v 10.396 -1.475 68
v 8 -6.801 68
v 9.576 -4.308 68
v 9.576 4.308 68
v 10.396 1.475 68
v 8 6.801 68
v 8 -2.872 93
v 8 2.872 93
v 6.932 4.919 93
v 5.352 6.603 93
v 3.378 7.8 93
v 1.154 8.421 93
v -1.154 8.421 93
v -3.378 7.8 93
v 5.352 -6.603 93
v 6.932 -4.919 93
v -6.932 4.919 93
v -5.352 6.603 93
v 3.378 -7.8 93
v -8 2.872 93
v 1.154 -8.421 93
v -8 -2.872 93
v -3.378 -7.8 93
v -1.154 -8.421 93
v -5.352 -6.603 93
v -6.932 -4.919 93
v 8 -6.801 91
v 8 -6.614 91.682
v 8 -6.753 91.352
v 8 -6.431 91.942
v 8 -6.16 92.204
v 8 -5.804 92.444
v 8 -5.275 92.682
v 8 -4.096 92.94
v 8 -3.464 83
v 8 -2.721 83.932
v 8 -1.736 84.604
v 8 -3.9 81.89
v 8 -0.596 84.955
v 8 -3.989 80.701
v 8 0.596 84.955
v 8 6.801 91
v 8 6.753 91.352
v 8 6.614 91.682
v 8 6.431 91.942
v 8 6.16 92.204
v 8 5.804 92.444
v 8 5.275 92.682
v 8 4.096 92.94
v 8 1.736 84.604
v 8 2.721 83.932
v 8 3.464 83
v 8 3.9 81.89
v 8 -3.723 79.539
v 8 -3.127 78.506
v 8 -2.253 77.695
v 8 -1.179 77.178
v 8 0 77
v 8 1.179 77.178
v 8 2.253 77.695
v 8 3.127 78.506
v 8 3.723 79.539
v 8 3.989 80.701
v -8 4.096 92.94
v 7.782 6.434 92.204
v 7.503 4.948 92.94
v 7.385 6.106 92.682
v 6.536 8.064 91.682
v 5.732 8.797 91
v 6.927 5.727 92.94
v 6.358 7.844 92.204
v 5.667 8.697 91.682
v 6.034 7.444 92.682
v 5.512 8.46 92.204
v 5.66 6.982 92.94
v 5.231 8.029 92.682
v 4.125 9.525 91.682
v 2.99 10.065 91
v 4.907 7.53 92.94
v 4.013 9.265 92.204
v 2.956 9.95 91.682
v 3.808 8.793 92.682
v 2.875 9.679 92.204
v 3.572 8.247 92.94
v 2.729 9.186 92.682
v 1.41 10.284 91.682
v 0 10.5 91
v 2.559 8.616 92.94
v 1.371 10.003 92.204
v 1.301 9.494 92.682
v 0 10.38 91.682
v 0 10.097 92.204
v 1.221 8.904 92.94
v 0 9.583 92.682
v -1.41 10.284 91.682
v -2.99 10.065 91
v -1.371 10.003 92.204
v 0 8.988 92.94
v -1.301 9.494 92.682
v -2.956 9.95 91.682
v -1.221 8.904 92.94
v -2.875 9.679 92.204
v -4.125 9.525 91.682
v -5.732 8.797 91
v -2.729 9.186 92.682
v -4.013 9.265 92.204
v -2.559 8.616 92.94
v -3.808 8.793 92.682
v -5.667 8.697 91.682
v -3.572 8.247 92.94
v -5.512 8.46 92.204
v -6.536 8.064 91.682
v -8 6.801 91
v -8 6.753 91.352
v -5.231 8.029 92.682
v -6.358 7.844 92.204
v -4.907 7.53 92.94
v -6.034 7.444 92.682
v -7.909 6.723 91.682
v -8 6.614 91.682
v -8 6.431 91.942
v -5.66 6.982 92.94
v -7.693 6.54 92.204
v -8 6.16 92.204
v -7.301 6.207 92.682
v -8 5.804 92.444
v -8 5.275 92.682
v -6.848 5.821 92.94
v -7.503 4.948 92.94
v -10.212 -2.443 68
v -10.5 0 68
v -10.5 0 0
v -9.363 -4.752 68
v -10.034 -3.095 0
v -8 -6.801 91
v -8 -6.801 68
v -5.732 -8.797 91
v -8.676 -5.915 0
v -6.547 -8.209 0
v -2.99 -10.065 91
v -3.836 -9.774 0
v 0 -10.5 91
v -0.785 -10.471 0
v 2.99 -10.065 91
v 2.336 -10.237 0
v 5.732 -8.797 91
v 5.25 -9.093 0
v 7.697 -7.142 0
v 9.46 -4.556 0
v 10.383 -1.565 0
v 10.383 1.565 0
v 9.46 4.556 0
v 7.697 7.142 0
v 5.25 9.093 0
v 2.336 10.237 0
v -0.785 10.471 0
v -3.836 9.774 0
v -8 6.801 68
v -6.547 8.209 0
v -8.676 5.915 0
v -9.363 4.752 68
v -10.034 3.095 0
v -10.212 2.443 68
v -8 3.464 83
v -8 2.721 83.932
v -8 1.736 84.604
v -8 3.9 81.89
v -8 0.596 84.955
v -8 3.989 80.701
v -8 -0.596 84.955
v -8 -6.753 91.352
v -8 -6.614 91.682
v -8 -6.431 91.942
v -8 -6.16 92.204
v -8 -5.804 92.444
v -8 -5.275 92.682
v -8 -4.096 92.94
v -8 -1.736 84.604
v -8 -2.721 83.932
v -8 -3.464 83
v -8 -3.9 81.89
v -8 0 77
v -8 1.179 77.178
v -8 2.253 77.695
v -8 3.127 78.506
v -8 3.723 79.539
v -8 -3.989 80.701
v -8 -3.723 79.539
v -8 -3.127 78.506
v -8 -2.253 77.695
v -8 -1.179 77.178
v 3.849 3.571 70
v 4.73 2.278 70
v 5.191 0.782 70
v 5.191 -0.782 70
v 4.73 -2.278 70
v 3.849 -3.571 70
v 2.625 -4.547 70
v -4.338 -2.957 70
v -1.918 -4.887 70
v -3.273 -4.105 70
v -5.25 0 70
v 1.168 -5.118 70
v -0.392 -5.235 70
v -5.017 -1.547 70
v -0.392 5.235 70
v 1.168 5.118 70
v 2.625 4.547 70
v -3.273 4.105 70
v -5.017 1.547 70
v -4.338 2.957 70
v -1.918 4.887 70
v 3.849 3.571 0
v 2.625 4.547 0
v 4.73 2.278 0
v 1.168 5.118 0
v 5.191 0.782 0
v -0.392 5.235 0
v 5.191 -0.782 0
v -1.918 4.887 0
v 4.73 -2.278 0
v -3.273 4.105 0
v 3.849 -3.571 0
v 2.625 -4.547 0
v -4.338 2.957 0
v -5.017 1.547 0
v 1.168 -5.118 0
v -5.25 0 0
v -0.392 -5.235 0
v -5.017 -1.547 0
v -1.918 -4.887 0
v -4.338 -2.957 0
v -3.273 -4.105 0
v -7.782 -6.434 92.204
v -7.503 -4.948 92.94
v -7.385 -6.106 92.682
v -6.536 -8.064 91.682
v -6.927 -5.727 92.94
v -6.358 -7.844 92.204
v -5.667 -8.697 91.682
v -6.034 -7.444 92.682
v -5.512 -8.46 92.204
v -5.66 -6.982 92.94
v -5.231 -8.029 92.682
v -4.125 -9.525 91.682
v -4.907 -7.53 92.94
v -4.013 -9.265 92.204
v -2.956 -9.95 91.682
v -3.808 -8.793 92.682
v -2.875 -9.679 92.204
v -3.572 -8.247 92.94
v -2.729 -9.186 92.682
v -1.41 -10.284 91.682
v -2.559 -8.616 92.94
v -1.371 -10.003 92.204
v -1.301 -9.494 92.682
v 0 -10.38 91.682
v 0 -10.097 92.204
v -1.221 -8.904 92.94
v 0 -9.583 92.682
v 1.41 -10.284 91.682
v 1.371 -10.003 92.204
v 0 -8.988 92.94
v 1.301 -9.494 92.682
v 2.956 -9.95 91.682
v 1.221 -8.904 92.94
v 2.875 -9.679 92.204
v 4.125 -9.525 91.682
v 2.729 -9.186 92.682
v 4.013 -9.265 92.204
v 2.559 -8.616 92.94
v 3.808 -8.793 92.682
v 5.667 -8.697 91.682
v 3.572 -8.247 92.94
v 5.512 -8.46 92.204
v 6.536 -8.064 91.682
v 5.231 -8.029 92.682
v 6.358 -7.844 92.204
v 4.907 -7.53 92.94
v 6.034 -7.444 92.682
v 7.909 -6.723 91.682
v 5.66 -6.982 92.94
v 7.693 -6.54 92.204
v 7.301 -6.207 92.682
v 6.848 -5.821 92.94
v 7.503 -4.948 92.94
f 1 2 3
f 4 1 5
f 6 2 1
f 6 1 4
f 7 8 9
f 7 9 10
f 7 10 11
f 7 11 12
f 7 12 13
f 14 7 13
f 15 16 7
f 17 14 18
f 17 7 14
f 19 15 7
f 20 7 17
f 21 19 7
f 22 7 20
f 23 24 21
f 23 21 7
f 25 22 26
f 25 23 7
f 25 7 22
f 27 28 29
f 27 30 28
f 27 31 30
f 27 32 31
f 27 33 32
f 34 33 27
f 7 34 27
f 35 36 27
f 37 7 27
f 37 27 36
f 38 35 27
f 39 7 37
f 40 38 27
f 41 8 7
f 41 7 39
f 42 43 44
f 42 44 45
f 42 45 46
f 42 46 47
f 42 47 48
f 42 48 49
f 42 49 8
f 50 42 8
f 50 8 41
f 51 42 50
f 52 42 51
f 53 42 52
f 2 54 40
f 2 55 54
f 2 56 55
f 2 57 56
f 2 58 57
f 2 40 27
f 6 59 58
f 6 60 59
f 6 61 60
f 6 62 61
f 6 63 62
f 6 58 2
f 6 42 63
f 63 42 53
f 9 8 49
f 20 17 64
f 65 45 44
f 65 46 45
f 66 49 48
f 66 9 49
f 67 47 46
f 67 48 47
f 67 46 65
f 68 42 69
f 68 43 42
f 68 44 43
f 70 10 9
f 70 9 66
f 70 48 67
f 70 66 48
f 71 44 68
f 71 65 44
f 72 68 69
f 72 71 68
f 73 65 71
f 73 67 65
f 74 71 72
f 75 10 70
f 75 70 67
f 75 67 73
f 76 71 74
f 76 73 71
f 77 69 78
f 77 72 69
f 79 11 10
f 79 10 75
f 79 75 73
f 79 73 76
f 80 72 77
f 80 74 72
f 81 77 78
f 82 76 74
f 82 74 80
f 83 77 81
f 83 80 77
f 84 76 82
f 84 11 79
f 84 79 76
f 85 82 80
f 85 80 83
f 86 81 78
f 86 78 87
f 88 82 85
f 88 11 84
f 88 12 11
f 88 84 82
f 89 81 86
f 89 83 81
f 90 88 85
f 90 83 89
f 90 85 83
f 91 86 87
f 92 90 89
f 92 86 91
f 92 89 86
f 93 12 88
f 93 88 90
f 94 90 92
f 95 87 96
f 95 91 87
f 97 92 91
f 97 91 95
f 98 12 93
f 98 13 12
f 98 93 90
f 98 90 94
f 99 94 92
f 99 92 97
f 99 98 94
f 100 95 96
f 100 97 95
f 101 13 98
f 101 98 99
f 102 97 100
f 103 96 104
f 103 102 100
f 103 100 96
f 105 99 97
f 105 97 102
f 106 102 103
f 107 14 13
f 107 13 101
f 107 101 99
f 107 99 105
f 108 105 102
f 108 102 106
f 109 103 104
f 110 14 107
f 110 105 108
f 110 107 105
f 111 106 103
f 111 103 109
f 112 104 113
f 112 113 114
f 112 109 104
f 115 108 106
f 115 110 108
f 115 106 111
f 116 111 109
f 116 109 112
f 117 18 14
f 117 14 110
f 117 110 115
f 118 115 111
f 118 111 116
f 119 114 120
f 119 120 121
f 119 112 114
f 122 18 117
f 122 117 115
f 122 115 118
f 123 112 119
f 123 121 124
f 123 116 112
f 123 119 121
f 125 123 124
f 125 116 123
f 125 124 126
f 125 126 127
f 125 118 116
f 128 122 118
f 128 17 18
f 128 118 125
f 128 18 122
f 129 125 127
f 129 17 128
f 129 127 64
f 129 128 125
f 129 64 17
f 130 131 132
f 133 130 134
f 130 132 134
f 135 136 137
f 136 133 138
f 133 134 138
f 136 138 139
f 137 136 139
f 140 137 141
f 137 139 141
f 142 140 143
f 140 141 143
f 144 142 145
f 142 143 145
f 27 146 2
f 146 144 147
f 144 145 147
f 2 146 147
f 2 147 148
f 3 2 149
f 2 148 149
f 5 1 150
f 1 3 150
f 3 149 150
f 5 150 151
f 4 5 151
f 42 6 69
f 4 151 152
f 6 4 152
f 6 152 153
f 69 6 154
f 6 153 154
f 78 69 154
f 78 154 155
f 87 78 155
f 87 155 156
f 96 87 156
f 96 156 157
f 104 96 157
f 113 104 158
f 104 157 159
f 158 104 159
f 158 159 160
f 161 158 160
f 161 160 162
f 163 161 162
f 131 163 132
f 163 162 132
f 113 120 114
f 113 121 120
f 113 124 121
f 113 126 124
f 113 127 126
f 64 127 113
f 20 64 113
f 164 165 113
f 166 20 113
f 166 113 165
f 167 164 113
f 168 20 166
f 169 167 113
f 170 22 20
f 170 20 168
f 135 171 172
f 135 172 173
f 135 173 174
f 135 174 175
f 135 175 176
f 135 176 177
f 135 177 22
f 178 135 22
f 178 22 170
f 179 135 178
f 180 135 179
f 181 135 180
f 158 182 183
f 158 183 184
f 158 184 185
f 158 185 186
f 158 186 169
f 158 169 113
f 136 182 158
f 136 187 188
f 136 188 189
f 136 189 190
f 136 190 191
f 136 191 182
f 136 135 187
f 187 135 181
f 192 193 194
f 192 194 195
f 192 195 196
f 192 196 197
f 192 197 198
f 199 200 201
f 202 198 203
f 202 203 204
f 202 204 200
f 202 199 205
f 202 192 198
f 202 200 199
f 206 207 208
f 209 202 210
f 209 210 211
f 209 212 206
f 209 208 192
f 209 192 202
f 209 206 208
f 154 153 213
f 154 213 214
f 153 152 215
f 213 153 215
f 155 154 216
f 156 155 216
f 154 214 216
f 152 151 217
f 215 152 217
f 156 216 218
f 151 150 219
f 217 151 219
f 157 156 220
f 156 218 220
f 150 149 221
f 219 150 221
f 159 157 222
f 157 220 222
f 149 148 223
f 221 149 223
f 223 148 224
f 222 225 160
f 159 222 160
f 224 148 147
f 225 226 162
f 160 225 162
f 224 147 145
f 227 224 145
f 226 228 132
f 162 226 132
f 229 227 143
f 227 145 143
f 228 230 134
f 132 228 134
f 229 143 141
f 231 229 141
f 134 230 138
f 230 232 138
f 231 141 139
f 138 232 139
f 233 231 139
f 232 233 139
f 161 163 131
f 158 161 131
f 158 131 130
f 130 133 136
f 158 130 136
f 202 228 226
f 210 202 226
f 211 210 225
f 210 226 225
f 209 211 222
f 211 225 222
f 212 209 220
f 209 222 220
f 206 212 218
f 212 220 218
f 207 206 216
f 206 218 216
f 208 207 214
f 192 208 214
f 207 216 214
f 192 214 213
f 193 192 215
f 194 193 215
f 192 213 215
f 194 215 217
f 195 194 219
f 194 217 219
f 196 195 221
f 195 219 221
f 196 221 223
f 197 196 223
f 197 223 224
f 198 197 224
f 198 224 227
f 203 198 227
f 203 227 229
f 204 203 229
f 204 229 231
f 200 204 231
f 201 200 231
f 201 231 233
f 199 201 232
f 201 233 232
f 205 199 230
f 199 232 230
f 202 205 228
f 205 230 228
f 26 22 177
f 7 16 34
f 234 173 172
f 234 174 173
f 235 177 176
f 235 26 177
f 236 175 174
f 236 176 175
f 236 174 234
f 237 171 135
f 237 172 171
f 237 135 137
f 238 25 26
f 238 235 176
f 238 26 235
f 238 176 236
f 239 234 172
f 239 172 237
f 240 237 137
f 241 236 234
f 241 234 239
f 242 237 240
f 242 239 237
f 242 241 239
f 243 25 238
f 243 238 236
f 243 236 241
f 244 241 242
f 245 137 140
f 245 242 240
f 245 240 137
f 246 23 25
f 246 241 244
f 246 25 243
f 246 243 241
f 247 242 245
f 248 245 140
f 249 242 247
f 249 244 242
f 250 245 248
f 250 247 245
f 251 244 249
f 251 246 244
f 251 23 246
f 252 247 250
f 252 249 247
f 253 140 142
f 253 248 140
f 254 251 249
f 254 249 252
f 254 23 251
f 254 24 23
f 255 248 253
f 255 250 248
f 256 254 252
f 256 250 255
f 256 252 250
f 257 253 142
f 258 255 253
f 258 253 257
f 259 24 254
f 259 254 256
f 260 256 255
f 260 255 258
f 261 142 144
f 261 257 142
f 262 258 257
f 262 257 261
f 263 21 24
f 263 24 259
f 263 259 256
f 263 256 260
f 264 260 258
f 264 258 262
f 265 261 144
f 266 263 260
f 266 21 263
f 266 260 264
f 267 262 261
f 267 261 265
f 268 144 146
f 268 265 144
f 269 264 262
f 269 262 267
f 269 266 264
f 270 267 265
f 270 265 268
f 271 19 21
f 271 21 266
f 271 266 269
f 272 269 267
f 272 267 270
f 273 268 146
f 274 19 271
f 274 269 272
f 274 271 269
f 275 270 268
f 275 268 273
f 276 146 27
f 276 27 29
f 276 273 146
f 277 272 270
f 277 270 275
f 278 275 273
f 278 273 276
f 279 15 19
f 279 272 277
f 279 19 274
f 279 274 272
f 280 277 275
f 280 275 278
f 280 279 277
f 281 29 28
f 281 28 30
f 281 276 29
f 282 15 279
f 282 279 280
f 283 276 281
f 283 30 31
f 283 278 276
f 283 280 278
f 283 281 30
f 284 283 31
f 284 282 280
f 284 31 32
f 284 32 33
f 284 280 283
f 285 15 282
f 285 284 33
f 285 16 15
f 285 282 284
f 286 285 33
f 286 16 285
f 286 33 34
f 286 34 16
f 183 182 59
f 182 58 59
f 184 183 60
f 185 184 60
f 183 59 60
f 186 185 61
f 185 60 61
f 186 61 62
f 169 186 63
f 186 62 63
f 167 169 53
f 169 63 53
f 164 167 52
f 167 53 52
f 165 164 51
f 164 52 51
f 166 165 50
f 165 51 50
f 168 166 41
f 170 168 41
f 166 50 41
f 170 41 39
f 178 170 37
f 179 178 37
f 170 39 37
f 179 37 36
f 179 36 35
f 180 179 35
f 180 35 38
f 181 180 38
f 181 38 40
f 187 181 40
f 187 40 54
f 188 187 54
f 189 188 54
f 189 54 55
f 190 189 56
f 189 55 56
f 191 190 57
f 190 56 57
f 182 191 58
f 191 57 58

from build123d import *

# Parameters (mm, degrees)
SKETCH_1_R          = 10.5
EXTRUDE_1_DEPTH     = 93
SKETCH_2_R          = 5.25
CUT_EXTRUDE_2_DEPTH = 70
FILLET_1_R          = 2
SKETCH_3_W          = 11
SKETCH_3_H          = 25
CUT_EXTRUDE_3_DEPTH = 15
SKETCH_4_R          = 4
CUT_EXTRUDE_4_DEPTH = 15


with BuildPart() as part:
    # Эскиз1 → Вытянуть1 (new body)
    with BuildSketch(Plane.XY):
        with Locations(Location((0, 0, 0), (0, 0, 180))):
            Circle(SKETCH_1_R)
    extrude(amount=EXTRUDE_1_DEPTH)

    # Эскиз2 → Вытянуть2 (cut)
    with BuildSketch(Plane(origin=(0, 0, 0), x_dir=(-1, 0, 0), z_dir=(0, 0, -1))):
        Circle(SKETCH_2_R)
    extrude(amount=-CUT_EXTRUDE_2_DEPTH, mode=Mode.SUBTRACT)

    # Скругление1
    fillet_1_edges = [part.edges().sort_by_distance(p)[0] for p in [
        (10.5, 0, 93),
    ]]
    fillet(fillet_1_edges, radius=FILLET_1_R)

    # Эскиз3 → Вытянуть3 (cut, symmetric)
    with BuildSketch(Plane(origin=(0, 0, 0), x_dir=(1, 0, 0), z_dir=(0, 1, 0))):
        with Locations((-13.5, -80.5)):
            Rectangle(SKETCH_3_W, SKETCH_3_H)
        with Locations((13.5, -80.5)):
            Rectangle(SKETCH_3_W, SKETCH_3_H)
    extrude(amount=CUT_EXTRUDE_3_DEPTH, both=True, mode=Mode.SUBTRACT)

    # Эскиз4 → Вытянуть4 (cut, symmetric)
    with BuildSketch(Plane(origin=(0, 0, 0), x_dir=(0, 0, -1), z_dir=(1, 0, 0))):
        with Locations((-81, 0)):
            Circle(SKETCH_4_R)
    extrude(amount=CUT_EXTRUDE_4_DEPTH, both=True, mode=Mode.SUBTRACT)


solid = part.part
